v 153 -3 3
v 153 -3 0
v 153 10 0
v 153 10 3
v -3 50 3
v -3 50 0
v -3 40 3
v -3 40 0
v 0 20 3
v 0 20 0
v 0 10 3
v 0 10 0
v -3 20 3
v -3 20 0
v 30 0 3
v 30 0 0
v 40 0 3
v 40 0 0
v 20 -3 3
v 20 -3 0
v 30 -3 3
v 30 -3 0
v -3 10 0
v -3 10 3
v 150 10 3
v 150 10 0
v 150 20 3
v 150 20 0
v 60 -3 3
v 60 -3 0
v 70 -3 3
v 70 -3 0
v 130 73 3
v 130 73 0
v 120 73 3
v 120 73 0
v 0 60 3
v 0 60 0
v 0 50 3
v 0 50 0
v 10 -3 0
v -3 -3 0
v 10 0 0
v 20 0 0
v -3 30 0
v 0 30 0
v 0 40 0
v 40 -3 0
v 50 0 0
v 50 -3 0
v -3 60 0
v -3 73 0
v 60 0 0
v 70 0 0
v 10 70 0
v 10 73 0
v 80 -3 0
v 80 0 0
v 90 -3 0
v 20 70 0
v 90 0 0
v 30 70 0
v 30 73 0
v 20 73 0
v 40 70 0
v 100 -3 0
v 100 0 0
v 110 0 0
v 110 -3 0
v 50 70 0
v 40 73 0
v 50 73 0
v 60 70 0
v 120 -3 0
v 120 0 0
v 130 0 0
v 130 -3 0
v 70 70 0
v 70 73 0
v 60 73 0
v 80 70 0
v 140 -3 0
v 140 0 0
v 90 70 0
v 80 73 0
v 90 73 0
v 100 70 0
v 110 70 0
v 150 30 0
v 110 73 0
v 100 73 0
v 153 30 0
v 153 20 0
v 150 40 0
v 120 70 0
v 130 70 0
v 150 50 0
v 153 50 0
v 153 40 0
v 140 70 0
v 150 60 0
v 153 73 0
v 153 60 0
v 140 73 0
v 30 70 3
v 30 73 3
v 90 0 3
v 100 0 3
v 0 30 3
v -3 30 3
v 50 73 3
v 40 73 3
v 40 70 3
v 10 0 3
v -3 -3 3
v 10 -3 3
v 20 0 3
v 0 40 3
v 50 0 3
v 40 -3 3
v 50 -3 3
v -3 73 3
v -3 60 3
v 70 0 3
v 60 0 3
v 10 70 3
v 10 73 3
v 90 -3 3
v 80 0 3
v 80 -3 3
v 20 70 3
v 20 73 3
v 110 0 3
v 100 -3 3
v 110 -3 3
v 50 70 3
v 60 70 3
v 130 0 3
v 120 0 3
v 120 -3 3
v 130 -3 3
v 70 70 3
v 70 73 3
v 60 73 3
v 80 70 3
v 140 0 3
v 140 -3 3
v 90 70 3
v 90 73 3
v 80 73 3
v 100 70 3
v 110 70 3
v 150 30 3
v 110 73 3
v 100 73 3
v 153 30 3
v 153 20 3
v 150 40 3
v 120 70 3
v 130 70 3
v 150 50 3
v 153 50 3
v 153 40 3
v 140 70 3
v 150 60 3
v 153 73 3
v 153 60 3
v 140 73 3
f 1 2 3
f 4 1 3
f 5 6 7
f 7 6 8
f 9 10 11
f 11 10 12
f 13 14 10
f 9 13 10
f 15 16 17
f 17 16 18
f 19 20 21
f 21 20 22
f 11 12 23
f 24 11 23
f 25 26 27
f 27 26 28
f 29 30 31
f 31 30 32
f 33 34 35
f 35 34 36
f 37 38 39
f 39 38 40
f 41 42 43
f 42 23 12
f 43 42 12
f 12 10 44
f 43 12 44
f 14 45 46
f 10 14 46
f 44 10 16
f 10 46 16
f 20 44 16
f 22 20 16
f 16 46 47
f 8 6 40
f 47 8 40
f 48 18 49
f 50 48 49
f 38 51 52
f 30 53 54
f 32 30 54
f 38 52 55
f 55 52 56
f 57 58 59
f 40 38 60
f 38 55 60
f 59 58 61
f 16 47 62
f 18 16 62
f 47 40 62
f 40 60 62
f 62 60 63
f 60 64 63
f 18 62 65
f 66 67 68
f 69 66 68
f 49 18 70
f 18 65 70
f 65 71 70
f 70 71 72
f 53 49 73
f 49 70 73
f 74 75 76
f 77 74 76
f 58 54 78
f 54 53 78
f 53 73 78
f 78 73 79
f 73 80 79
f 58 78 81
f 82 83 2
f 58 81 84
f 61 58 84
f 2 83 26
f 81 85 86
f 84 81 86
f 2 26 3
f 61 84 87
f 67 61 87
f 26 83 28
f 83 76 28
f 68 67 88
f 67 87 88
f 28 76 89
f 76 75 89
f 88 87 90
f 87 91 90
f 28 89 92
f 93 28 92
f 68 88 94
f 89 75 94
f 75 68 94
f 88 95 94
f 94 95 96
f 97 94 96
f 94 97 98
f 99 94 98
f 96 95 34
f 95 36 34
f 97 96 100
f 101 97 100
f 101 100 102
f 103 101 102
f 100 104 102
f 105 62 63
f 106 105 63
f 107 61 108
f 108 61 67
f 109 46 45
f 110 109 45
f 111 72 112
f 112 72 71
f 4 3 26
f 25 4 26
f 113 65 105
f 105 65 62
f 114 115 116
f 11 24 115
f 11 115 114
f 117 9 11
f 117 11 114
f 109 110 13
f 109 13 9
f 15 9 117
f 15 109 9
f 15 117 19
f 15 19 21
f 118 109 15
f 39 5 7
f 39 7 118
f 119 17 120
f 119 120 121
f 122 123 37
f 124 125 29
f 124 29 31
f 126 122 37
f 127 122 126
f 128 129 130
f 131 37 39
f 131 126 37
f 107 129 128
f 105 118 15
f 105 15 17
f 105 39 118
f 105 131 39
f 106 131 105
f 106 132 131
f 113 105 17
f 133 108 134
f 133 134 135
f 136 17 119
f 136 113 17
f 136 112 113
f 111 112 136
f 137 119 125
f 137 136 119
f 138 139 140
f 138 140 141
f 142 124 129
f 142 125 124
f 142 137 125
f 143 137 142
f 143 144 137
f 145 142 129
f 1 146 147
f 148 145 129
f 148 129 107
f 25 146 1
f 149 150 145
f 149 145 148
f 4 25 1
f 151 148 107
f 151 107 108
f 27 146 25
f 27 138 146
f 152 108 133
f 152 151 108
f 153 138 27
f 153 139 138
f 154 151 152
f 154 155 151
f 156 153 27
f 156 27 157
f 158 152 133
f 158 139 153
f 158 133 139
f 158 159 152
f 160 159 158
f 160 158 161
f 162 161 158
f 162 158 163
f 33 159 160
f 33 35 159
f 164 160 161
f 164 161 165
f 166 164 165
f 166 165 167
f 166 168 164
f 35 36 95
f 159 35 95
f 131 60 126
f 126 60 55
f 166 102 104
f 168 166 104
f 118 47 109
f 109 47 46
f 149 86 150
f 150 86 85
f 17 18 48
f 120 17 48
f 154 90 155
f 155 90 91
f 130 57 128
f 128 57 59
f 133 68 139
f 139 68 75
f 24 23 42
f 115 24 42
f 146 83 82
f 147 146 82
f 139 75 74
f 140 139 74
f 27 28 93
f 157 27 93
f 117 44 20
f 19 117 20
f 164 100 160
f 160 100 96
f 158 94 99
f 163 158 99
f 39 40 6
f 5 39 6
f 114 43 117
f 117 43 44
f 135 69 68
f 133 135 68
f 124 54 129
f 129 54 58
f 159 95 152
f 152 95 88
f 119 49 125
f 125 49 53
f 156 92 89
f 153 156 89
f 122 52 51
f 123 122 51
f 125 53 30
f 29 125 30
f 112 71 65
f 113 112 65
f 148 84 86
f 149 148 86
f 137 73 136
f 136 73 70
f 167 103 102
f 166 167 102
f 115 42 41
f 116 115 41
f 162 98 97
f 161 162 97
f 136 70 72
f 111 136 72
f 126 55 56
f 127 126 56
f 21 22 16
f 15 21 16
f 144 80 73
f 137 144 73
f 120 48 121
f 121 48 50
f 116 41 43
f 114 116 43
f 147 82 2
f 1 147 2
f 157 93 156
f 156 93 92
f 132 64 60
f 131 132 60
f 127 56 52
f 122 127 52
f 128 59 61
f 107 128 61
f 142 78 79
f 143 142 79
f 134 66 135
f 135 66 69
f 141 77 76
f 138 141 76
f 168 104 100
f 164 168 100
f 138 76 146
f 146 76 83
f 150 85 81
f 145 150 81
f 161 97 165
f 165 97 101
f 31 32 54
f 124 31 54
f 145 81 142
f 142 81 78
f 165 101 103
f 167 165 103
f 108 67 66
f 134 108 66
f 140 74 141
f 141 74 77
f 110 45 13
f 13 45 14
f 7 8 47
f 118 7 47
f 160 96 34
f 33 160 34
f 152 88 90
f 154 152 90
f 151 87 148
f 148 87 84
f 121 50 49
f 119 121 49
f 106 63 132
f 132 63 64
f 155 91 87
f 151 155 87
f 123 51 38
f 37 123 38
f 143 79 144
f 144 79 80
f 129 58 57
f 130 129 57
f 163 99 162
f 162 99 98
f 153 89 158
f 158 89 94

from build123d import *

# Parameters (mm, degrees)
BOSS_EXTRUDE1_DEPTH = 3


with BuildPart() as part:
    # Sketch1 → Boss-Extrude1 (new body)
    with BuildSketch(Plane.XY):
        Polygon((0, 60), (0, 50), (-3, 50), (-3, 40), (0, 40), (0, 30), (-3, 30), (-3, 20), (0, 20), (0, 10), (-3, 10), (-3, 0), (-3, -3), (0, -3), (10, -3), (10, 0), (20, 0), (20, -3), (30, -3), (30, 0), (40, 0), (40, -3), (50, -3), (50, 0), (60, 0), (60, -3), (70, -3), (70, 0), (80, 0), (80, -3), (90, -3), (90, 0), (100, 0), (100, -3), (110, -3), (110, 0), (120, 0), (120, -3), (130, -3), (130, 0), (140, 0), (140, -3), (150, -3), (153, -3), (153, 0), (153, 10), (150, 10), (150, 20), (153, 20), (153, 30), (150, 30), (150, 40), (153, 40), (153, 50), (150, 50), (150, 60), (153, 60), (153, 70), (153, 73), (150, 73), (140, 73), (140, 70), (130, 70), (130, 73), (120, 73), (120, 70), (110, 70), (110, 73), (100, 73), (100, 70), (90, 70), (90, 73), (80, 73), (80, 70), (70, 70), (70, 73), (60, 73), (60, 70), (50, 70), (50, 73), (40, 73), (40, 70), (30, 70), (30, 73), (20, 73), (20, 70), (10, 70), (10, 73), (0, 73), (-3, 73), (-3, 70), (-3, 60), align=None)
    extrude(amount=BOSS_EXTRUDE1_DEPTH)


solid = part.part
